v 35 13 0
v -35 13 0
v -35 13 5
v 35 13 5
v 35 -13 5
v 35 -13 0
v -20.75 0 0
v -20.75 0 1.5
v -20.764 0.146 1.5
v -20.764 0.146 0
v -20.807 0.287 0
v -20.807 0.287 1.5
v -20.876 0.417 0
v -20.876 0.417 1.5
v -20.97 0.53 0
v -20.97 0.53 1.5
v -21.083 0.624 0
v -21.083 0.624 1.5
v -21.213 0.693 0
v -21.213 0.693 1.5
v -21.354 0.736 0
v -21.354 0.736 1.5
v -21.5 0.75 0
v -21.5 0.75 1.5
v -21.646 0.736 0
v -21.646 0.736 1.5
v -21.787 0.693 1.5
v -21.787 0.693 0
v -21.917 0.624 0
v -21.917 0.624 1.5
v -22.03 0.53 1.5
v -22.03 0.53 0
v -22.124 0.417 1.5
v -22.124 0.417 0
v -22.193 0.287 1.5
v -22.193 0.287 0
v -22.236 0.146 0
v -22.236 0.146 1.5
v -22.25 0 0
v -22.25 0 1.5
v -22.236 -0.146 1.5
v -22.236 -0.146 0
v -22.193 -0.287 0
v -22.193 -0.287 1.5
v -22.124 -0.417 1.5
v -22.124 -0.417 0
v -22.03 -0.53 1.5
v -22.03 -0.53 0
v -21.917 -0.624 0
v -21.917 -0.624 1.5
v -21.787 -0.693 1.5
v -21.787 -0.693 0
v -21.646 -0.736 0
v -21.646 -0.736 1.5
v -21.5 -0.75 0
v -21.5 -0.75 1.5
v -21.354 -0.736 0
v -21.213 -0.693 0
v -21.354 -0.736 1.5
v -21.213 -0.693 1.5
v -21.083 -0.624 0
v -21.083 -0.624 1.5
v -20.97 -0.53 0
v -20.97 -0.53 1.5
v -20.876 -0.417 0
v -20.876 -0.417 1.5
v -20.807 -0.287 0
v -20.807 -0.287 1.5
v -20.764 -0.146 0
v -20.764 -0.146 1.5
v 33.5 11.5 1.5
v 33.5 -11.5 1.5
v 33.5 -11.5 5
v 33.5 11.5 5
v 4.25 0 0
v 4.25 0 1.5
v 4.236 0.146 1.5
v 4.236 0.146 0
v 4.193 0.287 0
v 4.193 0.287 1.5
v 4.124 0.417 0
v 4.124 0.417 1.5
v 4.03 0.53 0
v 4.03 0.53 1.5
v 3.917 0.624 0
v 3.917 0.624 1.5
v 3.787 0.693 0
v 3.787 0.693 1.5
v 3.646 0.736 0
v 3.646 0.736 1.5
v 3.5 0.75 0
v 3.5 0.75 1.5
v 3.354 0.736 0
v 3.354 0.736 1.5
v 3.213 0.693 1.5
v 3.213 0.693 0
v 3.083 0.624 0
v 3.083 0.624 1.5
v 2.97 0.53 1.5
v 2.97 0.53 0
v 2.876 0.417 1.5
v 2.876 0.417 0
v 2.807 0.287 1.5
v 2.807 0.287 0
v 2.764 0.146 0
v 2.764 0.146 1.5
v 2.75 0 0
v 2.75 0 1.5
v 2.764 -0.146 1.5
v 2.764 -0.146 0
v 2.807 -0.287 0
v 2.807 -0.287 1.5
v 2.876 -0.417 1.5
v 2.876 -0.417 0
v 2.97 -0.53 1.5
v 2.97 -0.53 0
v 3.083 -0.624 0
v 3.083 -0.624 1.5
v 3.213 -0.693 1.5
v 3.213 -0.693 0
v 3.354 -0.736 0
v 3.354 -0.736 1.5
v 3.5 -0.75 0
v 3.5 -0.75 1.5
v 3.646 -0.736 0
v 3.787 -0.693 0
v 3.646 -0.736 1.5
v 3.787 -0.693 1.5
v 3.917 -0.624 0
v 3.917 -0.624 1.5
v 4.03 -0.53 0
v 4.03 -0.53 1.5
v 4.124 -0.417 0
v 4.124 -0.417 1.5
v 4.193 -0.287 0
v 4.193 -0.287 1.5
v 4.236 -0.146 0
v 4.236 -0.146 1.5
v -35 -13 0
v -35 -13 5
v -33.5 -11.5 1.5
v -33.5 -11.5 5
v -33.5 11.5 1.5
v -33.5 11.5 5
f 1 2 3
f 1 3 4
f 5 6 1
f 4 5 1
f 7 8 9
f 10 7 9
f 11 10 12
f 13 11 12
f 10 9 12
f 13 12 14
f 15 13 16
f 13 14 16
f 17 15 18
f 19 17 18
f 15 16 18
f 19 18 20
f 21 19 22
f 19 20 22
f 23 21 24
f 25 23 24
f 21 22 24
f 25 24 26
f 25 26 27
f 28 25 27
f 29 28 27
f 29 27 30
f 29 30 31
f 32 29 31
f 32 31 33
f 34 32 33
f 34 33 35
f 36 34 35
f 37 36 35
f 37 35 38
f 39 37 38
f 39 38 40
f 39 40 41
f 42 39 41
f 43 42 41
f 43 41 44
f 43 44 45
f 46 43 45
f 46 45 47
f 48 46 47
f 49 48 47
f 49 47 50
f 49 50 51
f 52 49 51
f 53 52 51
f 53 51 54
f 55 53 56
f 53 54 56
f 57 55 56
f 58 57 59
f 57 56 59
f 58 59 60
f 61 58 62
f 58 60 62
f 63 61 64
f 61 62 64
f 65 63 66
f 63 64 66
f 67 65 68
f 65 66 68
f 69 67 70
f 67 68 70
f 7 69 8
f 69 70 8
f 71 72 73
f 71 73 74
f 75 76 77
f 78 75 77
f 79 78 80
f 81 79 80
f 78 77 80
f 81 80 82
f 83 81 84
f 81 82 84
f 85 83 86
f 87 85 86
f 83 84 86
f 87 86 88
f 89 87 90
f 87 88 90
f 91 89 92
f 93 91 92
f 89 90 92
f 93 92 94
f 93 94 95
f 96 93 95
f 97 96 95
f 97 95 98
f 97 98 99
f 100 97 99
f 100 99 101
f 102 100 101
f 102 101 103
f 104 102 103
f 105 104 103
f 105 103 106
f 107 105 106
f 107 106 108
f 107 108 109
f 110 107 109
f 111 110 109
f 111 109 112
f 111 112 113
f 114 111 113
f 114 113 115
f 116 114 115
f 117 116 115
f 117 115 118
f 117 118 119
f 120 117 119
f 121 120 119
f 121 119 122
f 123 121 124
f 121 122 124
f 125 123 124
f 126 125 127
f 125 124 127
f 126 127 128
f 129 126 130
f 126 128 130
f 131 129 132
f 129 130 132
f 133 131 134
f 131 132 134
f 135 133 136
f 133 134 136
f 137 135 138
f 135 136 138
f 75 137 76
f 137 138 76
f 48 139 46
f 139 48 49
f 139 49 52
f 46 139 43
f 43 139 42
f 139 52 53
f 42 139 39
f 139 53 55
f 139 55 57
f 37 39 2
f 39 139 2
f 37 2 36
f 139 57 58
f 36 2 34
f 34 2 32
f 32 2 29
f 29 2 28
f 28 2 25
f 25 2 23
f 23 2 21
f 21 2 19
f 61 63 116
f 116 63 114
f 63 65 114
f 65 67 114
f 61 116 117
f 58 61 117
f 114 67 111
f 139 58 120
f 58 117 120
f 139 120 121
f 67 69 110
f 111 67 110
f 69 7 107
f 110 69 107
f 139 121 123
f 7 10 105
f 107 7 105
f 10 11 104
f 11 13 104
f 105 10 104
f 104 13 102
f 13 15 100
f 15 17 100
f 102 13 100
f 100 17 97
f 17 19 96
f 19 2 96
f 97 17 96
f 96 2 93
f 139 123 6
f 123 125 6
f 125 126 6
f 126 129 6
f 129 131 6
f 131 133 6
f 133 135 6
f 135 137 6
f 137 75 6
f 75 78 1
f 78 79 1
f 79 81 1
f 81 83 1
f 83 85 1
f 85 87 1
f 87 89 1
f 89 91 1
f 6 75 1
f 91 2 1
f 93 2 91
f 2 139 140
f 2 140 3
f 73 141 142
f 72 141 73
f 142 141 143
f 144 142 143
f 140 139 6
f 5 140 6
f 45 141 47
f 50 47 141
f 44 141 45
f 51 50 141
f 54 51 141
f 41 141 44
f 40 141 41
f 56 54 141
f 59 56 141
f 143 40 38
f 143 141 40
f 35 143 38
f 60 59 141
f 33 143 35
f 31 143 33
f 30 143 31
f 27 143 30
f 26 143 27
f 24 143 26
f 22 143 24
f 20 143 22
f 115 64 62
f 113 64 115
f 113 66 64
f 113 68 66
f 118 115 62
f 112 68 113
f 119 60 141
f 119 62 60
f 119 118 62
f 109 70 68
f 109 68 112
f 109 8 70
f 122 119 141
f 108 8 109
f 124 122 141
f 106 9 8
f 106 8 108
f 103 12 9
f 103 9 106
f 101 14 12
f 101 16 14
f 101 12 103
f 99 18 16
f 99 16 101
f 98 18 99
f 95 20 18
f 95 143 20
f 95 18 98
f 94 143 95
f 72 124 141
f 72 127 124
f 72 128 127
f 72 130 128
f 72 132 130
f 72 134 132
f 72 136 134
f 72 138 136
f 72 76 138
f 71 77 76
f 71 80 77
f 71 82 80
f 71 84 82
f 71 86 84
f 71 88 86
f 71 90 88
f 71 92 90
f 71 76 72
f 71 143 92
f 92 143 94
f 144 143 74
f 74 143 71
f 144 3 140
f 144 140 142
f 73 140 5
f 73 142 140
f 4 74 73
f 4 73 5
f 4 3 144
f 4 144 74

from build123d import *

# Parameters (mm, degrees)
SKETCH1_W           = 70
SKETCH1_H           = 26
BOSS_EXTRUDE1_DEPTH = 5
SHELL1_T            = -1.5
SKETCH2_R           = 0.75
CUT_EXTRUDE1_DEPTH  = 2.5


with BuildPart() as part:
    # Sketch1 → Boss-Extrude1 (new body)
    with BuildSketch(Plane.XY):
        Rectangle(SKETCH1_W, SKETCH1_H)
    extrude(amount=BOSS_EXTRUDE1_DEPTH)

    # Shell1
    shell1_openings = [part.faces().sort_by_distance(p)[0] for p in [
        (0, 0, 5),
    ]]
    offset(amount=SHELL1_T, openings=shell1_openings, kind=Kind.INTERSECTION)

    # Sketch2 → Cut-Extrude1 (cut, through all)
    with BuildSketch(Plane.XY.offset(1.5)):
        with Locations((-21.5, 0)):
            Circle(SKETCH2_R)
        with Locations((3.5, 0)):
            Circle(SKETCH2_R)
    extrude(amount=-CUT_EXTRUDE1_DEPTH, mode=Mode.SUBTRACT)


solid = part.part
